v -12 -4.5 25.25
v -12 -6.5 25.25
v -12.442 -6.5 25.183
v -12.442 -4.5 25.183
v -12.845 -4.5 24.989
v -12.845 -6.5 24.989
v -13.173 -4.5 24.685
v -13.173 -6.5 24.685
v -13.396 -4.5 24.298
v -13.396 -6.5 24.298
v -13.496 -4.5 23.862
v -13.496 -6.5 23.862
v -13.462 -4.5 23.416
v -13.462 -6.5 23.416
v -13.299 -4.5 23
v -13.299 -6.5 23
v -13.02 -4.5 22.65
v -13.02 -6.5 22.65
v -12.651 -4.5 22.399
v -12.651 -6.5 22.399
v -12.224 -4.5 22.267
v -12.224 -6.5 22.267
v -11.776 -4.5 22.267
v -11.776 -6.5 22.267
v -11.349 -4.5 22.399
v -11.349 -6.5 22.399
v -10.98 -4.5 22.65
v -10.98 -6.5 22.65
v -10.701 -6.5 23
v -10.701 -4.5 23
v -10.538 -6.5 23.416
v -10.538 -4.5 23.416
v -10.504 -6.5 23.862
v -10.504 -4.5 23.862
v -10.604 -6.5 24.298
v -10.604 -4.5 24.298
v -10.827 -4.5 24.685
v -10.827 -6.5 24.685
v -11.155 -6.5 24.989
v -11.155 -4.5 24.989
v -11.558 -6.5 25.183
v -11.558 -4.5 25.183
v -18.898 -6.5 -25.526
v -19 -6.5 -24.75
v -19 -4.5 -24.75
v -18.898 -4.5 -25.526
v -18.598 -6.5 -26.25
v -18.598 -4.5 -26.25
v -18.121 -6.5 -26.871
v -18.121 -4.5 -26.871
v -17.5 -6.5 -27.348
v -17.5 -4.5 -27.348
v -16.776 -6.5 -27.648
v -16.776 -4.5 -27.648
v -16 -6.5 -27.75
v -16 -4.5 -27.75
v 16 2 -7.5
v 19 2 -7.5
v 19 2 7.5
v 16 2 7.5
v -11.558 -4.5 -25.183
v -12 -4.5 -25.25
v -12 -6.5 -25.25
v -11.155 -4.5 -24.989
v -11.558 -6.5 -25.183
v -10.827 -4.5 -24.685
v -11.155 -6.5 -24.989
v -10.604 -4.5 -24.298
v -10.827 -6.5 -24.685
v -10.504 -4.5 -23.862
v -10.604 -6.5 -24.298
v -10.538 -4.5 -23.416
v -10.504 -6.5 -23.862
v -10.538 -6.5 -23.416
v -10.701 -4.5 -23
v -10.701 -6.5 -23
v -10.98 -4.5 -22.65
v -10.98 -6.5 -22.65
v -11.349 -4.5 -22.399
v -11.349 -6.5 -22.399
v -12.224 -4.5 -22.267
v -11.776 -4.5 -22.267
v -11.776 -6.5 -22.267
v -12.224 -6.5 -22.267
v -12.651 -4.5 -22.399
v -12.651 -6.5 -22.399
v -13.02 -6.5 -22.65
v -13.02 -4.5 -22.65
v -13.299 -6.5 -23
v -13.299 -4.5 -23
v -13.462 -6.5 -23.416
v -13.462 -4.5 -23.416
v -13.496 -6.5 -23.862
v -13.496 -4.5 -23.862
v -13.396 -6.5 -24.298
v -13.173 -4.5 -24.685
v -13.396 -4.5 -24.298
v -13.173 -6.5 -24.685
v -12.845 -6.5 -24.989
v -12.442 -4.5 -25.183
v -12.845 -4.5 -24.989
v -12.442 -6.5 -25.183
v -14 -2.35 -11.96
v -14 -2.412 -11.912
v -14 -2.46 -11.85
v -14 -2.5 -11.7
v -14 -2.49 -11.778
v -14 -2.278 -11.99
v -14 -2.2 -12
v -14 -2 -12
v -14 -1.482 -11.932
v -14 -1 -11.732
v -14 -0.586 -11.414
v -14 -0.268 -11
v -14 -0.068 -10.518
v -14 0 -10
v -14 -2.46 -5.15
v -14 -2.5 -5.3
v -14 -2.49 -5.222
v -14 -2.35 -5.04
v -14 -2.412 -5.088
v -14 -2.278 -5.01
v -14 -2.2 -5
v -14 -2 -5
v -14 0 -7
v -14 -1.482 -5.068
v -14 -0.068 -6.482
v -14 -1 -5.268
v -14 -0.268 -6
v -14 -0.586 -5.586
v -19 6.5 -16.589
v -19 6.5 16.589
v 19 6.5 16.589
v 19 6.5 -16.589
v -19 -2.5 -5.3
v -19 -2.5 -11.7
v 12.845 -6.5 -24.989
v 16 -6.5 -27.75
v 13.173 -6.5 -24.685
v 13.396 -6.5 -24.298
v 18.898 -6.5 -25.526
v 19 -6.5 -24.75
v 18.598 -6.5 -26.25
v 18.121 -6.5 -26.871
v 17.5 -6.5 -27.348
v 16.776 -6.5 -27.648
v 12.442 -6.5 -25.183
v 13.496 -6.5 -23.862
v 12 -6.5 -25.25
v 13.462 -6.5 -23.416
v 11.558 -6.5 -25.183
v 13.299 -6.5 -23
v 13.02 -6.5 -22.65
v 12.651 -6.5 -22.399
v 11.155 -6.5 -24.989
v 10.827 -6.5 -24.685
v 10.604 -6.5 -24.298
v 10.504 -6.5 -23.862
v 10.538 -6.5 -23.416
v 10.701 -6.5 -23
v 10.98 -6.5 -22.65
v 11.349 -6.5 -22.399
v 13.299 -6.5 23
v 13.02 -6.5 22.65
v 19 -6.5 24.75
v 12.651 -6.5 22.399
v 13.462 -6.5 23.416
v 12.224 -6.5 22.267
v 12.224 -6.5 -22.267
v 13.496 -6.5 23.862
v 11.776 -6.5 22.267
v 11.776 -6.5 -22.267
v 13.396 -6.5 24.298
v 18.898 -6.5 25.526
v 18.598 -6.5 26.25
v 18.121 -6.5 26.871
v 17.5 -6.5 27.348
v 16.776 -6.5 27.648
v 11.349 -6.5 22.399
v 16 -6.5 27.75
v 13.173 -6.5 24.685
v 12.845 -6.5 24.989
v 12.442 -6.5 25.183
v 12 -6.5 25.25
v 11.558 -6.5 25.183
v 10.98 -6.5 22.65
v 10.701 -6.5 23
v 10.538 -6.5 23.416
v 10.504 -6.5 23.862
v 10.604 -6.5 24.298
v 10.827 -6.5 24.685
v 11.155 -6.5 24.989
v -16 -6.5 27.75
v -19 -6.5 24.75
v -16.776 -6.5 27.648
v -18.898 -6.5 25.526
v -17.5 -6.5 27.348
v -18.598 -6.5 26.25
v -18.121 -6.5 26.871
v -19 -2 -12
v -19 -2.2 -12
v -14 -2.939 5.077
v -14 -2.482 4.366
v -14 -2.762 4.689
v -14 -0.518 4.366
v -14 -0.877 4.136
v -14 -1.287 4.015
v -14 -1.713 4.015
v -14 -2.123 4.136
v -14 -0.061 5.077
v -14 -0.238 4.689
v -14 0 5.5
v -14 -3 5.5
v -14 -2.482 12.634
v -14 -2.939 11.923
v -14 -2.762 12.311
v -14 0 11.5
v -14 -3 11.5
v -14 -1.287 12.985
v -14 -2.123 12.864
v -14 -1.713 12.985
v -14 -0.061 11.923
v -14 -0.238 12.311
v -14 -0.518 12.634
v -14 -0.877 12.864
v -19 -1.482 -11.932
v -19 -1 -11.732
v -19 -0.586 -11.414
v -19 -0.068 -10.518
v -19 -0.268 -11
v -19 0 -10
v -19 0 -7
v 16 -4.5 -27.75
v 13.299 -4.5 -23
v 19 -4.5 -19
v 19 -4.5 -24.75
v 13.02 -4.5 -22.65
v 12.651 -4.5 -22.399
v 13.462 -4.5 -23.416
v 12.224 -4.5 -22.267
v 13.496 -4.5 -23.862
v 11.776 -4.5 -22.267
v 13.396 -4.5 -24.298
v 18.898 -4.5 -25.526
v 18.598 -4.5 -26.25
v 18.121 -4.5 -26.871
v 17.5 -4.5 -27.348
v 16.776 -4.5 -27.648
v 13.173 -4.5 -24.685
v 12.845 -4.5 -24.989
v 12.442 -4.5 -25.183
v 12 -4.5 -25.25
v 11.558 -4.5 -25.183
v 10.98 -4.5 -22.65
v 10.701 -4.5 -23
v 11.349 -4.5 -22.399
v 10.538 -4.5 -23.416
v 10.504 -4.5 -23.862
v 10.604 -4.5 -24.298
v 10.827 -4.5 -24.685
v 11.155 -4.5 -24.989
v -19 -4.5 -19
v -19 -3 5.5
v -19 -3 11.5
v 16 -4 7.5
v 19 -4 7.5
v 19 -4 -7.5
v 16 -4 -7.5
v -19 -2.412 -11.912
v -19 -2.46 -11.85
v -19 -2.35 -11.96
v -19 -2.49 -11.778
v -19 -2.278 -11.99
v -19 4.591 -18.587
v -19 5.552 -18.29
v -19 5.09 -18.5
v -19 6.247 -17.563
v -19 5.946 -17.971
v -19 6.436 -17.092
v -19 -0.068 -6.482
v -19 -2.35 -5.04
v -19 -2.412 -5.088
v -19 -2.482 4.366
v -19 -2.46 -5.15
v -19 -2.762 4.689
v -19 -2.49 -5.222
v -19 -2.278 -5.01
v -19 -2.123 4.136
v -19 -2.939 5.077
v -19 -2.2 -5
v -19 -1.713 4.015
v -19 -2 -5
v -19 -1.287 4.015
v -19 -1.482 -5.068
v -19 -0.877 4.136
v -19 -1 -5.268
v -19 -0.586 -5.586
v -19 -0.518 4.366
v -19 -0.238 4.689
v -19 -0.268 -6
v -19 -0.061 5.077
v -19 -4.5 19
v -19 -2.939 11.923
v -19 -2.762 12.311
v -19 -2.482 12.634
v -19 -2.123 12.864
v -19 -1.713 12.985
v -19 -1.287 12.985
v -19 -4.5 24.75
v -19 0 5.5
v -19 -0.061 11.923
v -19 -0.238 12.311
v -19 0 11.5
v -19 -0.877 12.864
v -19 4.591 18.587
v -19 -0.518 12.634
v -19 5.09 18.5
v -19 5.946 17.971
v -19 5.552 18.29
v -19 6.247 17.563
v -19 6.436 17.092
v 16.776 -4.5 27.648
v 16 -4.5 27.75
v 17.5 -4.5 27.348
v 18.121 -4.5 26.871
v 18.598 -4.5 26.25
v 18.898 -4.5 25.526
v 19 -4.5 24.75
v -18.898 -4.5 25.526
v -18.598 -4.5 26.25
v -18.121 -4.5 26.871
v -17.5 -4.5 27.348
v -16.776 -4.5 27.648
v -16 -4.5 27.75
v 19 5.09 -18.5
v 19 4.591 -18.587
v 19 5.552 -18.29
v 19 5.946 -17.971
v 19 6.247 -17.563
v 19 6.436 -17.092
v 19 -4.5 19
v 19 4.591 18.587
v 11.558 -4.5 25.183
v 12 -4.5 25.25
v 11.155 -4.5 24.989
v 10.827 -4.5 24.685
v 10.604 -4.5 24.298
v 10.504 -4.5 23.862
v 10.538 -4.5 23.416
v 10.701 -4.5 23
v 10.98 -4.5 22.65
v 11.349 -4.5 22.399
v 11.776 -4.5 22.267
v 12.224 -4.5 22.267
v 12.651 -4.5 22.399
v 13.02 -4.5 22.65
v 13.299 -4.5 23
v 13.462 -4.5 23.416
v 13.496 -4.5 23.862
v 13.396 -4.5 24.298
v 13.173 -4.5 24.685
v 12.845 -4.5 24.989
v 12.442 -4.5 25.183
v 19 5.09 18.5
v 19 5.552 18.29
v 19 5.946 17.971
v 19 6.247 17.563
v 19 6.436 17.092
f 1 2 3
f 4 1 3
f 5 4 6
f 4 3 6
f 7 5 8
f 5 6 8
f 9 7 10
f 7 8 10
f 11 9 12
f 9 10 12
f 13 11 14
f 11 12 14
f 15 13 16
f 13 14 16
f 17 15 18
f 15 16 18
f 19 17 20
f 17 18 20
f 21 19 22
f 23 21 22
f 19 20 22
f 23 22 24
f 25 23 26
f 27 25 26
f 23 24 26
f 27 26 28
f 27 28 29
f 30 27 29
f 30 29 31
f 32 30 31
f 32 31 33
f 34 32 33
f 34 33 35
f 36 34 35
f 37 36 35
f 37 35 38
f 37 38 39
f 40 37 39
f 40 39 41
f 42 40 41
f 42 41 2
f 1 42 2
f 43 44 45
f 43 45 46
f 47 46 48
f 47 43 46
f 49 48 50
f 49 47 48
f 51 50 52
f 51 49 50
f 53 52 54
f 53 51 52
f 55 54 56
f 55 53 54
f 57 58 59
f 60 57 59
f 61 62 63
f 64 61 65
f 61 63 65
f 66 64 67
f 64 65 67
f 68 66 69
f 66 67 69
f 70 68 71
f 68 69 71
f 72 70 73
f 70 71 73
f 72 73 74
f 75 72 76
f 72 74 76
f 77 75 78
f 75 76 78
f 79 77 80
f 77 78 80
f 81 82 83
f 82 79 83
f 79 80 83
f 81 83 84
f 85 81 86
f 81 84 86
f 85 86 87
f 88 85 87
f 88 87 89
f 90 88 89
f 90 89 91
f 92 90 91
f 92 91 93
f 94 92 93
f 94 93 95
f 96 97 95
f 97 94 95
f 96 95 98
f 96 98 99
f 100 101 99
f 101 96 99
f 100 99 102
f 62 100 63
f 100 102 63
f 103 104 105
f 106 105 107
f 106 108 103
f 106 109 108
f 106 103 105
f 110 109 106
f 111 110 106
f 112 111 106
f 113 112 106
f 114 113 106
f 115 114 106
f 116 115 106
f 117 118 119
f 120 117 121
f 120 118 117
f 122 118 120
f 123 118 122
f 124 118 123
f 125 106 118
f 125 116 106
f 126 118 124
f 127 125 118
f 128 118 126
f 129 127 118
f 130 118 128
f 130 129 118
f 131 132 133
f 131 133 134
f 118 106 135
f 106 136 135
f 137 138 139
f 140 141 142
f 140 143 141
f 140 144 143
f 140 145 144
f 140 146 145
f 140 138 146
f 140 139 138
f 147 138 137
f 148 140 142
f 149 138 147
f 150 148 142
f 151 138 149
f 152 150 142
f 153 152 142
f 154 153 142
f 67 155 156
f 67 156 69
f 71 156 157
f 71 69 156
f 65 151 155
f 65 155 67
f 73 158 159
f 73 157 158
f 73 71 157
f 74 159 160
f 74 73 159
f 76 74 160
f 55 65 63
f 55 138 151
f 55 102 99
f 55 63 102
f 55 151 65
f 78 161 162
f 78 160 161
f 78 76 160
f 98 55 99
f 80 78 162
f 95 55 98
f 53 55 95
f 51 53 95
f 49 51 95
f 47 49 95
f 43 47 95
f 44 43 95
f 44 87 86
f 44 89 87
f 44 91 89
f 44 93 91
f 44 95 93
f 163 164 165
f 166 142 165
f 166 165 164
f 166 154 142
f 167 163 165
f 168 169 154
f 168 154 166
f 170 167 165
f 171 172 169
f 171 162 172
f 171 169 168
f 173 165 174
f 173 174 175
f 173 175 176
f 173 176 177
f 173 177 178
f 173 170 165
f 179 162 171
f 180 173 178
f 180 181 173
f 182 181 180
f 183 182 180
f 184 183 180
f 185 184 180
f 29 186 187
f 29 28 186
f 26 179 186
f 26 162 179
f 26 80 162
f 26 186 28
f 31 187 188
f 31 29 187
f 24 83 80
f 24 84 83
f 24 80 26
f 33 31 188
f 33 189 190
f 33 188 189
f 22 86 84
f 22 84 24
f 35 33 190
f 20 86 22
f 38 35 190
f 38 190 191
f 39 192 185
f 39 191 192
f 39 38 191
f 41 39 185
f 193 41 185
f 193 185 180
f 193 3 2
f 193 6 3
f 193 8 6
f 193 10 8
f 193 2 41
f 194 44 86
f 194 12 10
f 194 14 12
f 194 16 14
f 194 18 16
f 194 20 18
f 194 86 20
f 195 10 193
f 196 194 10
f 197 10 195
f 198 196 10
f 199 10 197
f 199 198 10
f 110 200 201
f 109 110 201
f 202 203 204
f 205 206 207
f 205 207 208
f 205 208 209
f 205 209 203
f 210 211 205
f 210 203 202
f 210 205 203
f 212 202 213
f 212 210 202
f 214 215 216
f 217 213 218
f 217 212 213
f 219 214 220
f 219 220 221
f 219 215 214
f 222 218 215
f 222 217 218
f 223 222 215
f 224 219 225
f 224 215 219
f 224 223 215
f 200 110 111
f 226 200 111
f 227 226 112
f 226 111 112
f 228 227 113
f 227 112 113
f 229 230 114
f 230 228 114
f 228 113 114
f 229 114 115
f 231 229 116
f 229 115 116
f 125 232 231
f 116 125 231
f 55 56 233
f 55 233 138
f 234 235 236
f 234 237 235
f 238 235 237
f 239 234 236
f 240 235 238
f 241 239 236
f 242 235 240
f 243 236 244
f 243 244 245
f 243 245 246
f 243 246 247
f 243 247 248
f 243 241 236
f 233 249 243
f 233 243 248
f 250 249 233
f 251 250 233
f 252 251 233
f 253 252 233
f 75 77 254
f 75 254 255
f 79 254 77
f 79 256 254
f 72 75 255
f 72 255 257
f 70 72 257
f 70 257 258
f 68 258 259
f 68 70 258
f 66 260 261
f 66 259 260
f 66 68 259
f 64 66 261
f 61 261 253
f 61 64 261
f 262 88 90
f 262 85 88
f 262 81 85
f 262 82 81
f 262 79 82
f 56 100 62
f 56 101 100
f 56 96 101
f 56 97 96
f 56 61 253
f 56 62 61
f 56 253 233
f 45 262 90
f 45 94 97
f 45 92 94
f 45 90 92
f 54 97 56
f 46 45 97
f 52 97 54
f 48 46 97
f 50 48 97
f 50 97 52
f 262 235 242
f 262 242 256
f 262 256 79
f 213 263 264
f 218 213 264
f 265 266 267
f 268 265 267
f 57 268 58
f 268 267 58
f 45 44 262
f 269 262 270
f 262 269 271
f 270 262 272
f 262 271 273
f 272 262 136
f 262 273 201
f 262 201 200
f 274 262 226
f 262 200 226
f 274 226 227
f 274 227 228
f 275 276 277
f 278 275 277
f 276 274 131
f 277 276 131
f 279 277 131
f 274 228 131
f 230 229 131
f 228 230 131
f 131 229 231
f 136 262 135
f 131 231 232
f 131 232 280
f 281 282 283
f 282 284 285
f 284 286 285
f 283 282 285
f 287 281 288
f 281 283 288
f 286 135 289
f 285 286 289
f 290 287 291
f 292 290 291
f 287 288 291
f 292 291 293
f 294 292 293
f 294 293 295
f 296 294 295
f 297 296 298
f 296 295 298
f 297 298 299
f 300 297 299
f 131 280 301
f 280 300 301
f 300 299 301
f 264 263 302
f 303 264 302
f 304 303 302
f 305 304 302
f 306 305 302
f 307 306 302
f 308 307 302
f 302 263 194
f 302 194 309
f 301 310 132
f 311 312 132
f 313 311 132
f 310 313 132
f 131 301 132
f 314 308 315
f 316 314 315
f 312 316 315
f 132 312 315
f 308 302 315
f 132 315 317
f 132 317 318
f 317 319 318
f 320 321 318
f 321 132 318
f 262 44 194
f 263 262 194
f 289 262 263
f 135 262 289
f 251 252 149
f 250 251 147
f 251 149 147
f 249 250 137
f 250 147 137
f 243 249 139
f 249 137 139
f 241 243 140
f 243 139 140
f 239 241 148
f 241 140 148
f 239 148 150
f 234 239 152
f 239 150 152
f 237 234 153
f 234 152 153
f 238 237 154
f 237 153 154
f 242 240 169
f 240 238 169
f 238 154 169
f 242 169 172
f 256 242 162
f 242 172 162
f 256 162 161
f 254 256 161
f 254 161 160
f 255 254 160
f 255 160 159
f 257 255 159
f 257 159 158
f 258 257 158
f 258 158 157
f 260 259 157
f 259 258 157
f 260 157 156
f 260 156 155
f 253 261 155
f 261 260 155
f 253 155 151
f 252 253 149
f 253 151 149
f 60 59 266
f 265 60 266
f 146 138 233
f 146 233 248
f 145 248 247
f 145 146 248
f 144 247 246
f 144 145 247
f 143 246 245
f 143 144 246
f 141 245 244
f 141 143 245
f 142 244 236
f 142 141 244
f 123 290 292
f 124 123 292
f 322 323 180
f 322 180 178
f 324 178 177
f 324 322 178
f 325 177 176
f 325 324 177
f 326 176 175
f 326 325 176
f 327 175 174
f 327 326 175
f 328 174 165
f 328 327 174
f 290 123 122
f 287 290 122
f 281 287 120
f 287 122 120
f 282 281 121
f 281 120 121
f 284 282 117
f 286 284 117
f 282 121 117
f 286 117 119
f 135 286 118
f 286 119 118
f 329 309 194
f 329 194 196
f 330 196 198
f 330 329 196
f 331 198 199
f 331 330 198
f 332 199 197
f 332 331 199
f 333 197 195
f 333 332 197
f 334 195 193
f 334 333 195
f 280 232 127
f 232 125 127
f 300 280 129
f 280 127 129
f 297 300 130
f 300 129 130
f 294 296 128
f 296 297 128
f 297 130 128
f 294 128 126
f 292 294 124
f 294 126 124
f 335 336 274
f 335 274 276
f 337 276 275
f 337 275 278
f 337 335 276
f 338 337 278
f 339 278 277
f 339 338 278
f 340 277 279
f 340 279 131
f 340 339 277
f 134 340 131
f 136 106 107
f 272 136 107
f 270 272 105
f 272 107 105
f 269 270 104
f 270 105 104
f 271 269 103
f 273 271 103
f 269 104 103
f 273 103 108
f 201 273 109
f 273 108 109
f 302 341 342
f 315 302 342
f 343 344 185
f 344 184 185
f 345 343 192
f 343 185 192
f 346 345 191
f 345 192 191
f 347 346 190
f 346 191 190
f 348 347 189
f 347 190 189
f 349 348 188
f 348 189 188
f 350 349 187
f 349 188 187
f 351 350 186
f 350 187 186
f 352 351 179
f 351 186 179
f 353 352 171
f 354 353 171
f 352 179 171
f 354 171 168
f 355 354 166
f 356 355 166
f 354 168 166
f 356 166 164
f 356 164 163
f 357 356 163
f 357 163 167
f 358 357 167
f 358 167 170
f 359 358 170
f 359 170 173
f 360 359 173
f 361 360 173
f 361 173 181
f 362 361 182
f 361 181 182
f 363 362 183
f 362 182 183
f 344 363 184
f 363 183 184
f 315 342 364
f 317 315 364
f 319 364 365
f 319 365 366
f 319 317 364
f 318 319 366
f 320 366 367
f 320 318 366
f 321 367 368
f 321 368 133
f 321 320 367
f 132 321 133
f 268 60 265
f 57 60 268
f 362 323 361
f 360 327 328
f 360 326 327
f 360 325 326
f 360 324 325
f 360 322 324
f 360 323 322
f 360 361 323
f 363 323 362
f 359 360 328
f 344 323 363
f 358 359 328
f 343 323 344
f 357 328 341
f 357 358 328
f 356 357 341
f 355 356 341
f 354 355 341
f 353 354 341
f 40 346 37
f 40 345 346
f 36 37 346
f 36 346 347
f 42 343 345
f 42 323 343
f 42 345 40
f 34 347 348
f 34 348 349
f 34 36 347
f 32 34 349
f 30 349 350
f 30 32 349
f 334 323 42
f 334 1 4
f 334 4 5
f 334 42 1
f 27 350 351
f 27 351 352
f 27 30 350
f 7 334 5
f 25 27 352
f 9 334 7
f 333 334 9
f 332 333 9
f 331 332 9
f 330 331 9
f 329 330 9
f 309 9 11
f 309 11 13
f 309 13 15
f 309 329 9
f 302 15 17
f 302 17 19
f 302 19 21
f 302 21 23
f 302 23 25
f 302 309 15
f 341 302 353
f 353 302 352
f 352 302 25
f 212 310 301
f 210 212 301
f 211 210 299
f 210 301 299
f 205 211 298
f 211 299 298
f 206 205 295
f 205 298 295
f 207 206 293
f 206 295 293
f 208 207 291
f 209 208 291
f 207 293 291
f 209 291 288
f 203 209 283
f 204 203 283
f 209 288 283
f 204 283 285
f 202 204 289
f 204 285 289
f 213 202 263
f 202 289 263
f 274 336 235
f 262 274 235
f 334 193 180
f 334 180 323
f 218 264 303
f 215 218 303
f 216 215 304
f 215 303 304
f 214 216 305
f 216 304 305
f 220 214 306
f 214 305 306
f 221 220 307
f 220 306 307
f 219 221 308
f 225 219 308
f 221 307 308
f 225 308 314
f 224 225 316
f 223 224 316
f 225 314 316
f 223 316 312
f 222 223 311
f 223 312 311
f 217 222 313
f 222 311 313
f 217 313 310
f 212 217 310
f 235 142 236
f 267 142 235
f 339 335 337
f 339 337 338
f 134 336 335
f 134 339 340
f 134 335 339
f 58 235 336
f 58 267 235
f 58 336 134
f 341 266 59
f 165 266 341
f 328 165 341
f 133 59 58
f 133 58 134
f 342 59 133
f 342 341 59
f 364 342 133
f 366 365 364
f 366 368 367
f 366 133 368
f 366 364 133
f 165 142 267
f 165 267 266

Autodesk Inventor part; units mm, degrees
ref_plane "YZ Plane" through (0, 0, 0) normal (1, 0, 0) x (0, 1, 0)
ref_plane "XZ Plane" through (0, 0, 0) normal (0, 1, 0) x (-1, 0, 0)
ref_plane "XY Plane" through (0, 0, 0) normal (0, 0, 1) x (1, 0, 0)
sketch "スケッチ1" plane through (0, 0, 0) normal (1, 0, 0) x (0, 1, 0)
  line L0 (-6.5, 27.75) -> (6.5, 27.75)
  line L1 (6.5, 27.75) -> (6.5, -27.75)
  line L2 (6.5, -27.75) -> (-6.5, -27.75)
  line L3 (-6.5, -27.75) -> (-6.5, 27.75)
  line L4 (-6.5, 27.75) -> (6.5, -27.75) construction
  line L5 (6.5, 27.75) -> (-6.5, -27.75) construction
  line L6 (6.5, 19) -> (-4.5, 19)
  line L7 (-4.5, 19) -> (-4.5, -19)
  line L8 (-4.5, -19) -> (6.5, -19)
  line L9 (6.5, -19) -> (6.5, 19)
  line L10 (-4.5, 27.75) -> (-4.5, 19)
  line L11 (-4.5, 19) -> (6.5, 18.5)
  line L12 (6.5, -18.5) -> (-4.5, -19)
  line L13 (-4.5, -19) -> (-4.5, -27.75)
  point P0 (0, 0)
  point P1 (6.5, 0)
  point P2 (6.5, 18.5)
  dimension "d0" = 13
  dimension "d1" = 55.5
  dimension "d2" = 11
  dimension "d3" = 38
  dimension "d4" = 0.5
  dimension "d5" = 0.5
extrude "押し出し1" add sketch "スケッチ1" along normal mid plane 38 contours L0 L10 L7 L13 L2 L3 | L11 L1 L12 L7
fillet "フィレット1" radius 2 2 edges at (0, 6.5, 18.5) (0, 6.5, -18.5)
sketch "スケッチ2" plane through (-19, -4.5, 27.75) normal (0, 1, 0) x (1, 0, 0)
  line L0 (7, 4) -> (31, 4) construction
  line L1 (7, 4) -> (31, 4) construction
  line L2 (0, 0) -> (38, 0) construction
  point P0 (19, 27.75)
  point P1 (19, 4)
  dimension "d9" = 24
  dimension "d10" = 0
  dimension "d11" = 4
hole "穴1" at (-12, -4.5, 23.75) at (12, -4.5, 23.75) direction (0, -1, 0) diameter 3 end through all
fillet "フィレット2" radius 3 2 edges at (19, -5.5, 27.75) (-19, -5.5, 27.75)
mirror "ミラー1" about plane through (0, 0, 0) normal (0, 0, 1) of "穴1", "フィレット2"
sketch "スケッチ3" plane through (19, 0, 0) normal (1, 0, 0) x (0, 0, -1)
  line L0 (-7.5, -4) -> (7.5, -4)
  line L1 (7.5, -4) -> (7.5, 2)
  line L2 (7.5, 2) -> (-7.5, 2)
  line L3 (-7.5, 2) -> (-7.5, -4)
  line L4 (-7.5, -4) -> (7.5, 2) construction
  line L5 (7.5, -4) -> (-7.5, 2) construction
  line L6 (-24.75, -6.5) -> (24.75, -6.5) projected
  point P0 (0, 0)
  point P1 (0, -1)
  dimension "d20" = 15
  dimension "d21" = 6
  dimension "d22" = 2.5
extrude "押し出し2" cut sketch "スケッチ3" against normal blind 3
sketch "スケッチ4" plane through (-19, 0, 0) normal (-1, 0, 0) x (0, 0, 1)
  line L0 (5.5, -1.5) -> (11.5, -1.5) construction
  line L1 (5.5, -3) -> (11.5, -3)
  line L2 (11.5, 0) -> (5.5, 0)
  arc A0 (5.5, 0) -> (5.5, -3) centre (5.5, -1.5) ccw
  arc A1 (11.5, -3) -> (11.5, 0) centre (11.5, -1.5) ccw
  line L3 (8.5, -1.5) -> (14.5, -1.5) construction
  line L4 (-12, -2.5) -> (-5, -2.5)
  line L5 (-5, -2.5) -> (-5, 0)
  line L6 (-5, 0) -> (-12, 0)
  line L7 (-12, 0) -> (-12, -2.5)
  line L8 (-12, -2.5) -> (-5, 0) construction
  line L9 (-5, -2.5) -> (-12, 0) construction
  point P0 (0, 0)
  point P1 (-8.5, -1.25)
  point P2 (-8.5, 0)
  point P3 (8.5, 0)
  dimension "d25" = 3
  dimension "d26" = 0
  dimension "d27" = 3
  dimension "d28" = 7
  dimension "d29" = 2.5
  dimension "d30" = 8.5
  dimension "d31" = 8.5
extrude "押し出し3" cut sketch "スケッチ4" against normal blind 5
fillet "フィレット3" radius 0.3 2 edges at (-16.5, -2.5, -12) (-16.5, -2.5, -5)
fillet "フィレット4" radius 2 2 edges at (-16.5, 0, -12) (-16.5, 0, -5)
equation "\"d5\" = d4"
equation "\"d30\" = d31"
properties part number "LiDAR_slave"
